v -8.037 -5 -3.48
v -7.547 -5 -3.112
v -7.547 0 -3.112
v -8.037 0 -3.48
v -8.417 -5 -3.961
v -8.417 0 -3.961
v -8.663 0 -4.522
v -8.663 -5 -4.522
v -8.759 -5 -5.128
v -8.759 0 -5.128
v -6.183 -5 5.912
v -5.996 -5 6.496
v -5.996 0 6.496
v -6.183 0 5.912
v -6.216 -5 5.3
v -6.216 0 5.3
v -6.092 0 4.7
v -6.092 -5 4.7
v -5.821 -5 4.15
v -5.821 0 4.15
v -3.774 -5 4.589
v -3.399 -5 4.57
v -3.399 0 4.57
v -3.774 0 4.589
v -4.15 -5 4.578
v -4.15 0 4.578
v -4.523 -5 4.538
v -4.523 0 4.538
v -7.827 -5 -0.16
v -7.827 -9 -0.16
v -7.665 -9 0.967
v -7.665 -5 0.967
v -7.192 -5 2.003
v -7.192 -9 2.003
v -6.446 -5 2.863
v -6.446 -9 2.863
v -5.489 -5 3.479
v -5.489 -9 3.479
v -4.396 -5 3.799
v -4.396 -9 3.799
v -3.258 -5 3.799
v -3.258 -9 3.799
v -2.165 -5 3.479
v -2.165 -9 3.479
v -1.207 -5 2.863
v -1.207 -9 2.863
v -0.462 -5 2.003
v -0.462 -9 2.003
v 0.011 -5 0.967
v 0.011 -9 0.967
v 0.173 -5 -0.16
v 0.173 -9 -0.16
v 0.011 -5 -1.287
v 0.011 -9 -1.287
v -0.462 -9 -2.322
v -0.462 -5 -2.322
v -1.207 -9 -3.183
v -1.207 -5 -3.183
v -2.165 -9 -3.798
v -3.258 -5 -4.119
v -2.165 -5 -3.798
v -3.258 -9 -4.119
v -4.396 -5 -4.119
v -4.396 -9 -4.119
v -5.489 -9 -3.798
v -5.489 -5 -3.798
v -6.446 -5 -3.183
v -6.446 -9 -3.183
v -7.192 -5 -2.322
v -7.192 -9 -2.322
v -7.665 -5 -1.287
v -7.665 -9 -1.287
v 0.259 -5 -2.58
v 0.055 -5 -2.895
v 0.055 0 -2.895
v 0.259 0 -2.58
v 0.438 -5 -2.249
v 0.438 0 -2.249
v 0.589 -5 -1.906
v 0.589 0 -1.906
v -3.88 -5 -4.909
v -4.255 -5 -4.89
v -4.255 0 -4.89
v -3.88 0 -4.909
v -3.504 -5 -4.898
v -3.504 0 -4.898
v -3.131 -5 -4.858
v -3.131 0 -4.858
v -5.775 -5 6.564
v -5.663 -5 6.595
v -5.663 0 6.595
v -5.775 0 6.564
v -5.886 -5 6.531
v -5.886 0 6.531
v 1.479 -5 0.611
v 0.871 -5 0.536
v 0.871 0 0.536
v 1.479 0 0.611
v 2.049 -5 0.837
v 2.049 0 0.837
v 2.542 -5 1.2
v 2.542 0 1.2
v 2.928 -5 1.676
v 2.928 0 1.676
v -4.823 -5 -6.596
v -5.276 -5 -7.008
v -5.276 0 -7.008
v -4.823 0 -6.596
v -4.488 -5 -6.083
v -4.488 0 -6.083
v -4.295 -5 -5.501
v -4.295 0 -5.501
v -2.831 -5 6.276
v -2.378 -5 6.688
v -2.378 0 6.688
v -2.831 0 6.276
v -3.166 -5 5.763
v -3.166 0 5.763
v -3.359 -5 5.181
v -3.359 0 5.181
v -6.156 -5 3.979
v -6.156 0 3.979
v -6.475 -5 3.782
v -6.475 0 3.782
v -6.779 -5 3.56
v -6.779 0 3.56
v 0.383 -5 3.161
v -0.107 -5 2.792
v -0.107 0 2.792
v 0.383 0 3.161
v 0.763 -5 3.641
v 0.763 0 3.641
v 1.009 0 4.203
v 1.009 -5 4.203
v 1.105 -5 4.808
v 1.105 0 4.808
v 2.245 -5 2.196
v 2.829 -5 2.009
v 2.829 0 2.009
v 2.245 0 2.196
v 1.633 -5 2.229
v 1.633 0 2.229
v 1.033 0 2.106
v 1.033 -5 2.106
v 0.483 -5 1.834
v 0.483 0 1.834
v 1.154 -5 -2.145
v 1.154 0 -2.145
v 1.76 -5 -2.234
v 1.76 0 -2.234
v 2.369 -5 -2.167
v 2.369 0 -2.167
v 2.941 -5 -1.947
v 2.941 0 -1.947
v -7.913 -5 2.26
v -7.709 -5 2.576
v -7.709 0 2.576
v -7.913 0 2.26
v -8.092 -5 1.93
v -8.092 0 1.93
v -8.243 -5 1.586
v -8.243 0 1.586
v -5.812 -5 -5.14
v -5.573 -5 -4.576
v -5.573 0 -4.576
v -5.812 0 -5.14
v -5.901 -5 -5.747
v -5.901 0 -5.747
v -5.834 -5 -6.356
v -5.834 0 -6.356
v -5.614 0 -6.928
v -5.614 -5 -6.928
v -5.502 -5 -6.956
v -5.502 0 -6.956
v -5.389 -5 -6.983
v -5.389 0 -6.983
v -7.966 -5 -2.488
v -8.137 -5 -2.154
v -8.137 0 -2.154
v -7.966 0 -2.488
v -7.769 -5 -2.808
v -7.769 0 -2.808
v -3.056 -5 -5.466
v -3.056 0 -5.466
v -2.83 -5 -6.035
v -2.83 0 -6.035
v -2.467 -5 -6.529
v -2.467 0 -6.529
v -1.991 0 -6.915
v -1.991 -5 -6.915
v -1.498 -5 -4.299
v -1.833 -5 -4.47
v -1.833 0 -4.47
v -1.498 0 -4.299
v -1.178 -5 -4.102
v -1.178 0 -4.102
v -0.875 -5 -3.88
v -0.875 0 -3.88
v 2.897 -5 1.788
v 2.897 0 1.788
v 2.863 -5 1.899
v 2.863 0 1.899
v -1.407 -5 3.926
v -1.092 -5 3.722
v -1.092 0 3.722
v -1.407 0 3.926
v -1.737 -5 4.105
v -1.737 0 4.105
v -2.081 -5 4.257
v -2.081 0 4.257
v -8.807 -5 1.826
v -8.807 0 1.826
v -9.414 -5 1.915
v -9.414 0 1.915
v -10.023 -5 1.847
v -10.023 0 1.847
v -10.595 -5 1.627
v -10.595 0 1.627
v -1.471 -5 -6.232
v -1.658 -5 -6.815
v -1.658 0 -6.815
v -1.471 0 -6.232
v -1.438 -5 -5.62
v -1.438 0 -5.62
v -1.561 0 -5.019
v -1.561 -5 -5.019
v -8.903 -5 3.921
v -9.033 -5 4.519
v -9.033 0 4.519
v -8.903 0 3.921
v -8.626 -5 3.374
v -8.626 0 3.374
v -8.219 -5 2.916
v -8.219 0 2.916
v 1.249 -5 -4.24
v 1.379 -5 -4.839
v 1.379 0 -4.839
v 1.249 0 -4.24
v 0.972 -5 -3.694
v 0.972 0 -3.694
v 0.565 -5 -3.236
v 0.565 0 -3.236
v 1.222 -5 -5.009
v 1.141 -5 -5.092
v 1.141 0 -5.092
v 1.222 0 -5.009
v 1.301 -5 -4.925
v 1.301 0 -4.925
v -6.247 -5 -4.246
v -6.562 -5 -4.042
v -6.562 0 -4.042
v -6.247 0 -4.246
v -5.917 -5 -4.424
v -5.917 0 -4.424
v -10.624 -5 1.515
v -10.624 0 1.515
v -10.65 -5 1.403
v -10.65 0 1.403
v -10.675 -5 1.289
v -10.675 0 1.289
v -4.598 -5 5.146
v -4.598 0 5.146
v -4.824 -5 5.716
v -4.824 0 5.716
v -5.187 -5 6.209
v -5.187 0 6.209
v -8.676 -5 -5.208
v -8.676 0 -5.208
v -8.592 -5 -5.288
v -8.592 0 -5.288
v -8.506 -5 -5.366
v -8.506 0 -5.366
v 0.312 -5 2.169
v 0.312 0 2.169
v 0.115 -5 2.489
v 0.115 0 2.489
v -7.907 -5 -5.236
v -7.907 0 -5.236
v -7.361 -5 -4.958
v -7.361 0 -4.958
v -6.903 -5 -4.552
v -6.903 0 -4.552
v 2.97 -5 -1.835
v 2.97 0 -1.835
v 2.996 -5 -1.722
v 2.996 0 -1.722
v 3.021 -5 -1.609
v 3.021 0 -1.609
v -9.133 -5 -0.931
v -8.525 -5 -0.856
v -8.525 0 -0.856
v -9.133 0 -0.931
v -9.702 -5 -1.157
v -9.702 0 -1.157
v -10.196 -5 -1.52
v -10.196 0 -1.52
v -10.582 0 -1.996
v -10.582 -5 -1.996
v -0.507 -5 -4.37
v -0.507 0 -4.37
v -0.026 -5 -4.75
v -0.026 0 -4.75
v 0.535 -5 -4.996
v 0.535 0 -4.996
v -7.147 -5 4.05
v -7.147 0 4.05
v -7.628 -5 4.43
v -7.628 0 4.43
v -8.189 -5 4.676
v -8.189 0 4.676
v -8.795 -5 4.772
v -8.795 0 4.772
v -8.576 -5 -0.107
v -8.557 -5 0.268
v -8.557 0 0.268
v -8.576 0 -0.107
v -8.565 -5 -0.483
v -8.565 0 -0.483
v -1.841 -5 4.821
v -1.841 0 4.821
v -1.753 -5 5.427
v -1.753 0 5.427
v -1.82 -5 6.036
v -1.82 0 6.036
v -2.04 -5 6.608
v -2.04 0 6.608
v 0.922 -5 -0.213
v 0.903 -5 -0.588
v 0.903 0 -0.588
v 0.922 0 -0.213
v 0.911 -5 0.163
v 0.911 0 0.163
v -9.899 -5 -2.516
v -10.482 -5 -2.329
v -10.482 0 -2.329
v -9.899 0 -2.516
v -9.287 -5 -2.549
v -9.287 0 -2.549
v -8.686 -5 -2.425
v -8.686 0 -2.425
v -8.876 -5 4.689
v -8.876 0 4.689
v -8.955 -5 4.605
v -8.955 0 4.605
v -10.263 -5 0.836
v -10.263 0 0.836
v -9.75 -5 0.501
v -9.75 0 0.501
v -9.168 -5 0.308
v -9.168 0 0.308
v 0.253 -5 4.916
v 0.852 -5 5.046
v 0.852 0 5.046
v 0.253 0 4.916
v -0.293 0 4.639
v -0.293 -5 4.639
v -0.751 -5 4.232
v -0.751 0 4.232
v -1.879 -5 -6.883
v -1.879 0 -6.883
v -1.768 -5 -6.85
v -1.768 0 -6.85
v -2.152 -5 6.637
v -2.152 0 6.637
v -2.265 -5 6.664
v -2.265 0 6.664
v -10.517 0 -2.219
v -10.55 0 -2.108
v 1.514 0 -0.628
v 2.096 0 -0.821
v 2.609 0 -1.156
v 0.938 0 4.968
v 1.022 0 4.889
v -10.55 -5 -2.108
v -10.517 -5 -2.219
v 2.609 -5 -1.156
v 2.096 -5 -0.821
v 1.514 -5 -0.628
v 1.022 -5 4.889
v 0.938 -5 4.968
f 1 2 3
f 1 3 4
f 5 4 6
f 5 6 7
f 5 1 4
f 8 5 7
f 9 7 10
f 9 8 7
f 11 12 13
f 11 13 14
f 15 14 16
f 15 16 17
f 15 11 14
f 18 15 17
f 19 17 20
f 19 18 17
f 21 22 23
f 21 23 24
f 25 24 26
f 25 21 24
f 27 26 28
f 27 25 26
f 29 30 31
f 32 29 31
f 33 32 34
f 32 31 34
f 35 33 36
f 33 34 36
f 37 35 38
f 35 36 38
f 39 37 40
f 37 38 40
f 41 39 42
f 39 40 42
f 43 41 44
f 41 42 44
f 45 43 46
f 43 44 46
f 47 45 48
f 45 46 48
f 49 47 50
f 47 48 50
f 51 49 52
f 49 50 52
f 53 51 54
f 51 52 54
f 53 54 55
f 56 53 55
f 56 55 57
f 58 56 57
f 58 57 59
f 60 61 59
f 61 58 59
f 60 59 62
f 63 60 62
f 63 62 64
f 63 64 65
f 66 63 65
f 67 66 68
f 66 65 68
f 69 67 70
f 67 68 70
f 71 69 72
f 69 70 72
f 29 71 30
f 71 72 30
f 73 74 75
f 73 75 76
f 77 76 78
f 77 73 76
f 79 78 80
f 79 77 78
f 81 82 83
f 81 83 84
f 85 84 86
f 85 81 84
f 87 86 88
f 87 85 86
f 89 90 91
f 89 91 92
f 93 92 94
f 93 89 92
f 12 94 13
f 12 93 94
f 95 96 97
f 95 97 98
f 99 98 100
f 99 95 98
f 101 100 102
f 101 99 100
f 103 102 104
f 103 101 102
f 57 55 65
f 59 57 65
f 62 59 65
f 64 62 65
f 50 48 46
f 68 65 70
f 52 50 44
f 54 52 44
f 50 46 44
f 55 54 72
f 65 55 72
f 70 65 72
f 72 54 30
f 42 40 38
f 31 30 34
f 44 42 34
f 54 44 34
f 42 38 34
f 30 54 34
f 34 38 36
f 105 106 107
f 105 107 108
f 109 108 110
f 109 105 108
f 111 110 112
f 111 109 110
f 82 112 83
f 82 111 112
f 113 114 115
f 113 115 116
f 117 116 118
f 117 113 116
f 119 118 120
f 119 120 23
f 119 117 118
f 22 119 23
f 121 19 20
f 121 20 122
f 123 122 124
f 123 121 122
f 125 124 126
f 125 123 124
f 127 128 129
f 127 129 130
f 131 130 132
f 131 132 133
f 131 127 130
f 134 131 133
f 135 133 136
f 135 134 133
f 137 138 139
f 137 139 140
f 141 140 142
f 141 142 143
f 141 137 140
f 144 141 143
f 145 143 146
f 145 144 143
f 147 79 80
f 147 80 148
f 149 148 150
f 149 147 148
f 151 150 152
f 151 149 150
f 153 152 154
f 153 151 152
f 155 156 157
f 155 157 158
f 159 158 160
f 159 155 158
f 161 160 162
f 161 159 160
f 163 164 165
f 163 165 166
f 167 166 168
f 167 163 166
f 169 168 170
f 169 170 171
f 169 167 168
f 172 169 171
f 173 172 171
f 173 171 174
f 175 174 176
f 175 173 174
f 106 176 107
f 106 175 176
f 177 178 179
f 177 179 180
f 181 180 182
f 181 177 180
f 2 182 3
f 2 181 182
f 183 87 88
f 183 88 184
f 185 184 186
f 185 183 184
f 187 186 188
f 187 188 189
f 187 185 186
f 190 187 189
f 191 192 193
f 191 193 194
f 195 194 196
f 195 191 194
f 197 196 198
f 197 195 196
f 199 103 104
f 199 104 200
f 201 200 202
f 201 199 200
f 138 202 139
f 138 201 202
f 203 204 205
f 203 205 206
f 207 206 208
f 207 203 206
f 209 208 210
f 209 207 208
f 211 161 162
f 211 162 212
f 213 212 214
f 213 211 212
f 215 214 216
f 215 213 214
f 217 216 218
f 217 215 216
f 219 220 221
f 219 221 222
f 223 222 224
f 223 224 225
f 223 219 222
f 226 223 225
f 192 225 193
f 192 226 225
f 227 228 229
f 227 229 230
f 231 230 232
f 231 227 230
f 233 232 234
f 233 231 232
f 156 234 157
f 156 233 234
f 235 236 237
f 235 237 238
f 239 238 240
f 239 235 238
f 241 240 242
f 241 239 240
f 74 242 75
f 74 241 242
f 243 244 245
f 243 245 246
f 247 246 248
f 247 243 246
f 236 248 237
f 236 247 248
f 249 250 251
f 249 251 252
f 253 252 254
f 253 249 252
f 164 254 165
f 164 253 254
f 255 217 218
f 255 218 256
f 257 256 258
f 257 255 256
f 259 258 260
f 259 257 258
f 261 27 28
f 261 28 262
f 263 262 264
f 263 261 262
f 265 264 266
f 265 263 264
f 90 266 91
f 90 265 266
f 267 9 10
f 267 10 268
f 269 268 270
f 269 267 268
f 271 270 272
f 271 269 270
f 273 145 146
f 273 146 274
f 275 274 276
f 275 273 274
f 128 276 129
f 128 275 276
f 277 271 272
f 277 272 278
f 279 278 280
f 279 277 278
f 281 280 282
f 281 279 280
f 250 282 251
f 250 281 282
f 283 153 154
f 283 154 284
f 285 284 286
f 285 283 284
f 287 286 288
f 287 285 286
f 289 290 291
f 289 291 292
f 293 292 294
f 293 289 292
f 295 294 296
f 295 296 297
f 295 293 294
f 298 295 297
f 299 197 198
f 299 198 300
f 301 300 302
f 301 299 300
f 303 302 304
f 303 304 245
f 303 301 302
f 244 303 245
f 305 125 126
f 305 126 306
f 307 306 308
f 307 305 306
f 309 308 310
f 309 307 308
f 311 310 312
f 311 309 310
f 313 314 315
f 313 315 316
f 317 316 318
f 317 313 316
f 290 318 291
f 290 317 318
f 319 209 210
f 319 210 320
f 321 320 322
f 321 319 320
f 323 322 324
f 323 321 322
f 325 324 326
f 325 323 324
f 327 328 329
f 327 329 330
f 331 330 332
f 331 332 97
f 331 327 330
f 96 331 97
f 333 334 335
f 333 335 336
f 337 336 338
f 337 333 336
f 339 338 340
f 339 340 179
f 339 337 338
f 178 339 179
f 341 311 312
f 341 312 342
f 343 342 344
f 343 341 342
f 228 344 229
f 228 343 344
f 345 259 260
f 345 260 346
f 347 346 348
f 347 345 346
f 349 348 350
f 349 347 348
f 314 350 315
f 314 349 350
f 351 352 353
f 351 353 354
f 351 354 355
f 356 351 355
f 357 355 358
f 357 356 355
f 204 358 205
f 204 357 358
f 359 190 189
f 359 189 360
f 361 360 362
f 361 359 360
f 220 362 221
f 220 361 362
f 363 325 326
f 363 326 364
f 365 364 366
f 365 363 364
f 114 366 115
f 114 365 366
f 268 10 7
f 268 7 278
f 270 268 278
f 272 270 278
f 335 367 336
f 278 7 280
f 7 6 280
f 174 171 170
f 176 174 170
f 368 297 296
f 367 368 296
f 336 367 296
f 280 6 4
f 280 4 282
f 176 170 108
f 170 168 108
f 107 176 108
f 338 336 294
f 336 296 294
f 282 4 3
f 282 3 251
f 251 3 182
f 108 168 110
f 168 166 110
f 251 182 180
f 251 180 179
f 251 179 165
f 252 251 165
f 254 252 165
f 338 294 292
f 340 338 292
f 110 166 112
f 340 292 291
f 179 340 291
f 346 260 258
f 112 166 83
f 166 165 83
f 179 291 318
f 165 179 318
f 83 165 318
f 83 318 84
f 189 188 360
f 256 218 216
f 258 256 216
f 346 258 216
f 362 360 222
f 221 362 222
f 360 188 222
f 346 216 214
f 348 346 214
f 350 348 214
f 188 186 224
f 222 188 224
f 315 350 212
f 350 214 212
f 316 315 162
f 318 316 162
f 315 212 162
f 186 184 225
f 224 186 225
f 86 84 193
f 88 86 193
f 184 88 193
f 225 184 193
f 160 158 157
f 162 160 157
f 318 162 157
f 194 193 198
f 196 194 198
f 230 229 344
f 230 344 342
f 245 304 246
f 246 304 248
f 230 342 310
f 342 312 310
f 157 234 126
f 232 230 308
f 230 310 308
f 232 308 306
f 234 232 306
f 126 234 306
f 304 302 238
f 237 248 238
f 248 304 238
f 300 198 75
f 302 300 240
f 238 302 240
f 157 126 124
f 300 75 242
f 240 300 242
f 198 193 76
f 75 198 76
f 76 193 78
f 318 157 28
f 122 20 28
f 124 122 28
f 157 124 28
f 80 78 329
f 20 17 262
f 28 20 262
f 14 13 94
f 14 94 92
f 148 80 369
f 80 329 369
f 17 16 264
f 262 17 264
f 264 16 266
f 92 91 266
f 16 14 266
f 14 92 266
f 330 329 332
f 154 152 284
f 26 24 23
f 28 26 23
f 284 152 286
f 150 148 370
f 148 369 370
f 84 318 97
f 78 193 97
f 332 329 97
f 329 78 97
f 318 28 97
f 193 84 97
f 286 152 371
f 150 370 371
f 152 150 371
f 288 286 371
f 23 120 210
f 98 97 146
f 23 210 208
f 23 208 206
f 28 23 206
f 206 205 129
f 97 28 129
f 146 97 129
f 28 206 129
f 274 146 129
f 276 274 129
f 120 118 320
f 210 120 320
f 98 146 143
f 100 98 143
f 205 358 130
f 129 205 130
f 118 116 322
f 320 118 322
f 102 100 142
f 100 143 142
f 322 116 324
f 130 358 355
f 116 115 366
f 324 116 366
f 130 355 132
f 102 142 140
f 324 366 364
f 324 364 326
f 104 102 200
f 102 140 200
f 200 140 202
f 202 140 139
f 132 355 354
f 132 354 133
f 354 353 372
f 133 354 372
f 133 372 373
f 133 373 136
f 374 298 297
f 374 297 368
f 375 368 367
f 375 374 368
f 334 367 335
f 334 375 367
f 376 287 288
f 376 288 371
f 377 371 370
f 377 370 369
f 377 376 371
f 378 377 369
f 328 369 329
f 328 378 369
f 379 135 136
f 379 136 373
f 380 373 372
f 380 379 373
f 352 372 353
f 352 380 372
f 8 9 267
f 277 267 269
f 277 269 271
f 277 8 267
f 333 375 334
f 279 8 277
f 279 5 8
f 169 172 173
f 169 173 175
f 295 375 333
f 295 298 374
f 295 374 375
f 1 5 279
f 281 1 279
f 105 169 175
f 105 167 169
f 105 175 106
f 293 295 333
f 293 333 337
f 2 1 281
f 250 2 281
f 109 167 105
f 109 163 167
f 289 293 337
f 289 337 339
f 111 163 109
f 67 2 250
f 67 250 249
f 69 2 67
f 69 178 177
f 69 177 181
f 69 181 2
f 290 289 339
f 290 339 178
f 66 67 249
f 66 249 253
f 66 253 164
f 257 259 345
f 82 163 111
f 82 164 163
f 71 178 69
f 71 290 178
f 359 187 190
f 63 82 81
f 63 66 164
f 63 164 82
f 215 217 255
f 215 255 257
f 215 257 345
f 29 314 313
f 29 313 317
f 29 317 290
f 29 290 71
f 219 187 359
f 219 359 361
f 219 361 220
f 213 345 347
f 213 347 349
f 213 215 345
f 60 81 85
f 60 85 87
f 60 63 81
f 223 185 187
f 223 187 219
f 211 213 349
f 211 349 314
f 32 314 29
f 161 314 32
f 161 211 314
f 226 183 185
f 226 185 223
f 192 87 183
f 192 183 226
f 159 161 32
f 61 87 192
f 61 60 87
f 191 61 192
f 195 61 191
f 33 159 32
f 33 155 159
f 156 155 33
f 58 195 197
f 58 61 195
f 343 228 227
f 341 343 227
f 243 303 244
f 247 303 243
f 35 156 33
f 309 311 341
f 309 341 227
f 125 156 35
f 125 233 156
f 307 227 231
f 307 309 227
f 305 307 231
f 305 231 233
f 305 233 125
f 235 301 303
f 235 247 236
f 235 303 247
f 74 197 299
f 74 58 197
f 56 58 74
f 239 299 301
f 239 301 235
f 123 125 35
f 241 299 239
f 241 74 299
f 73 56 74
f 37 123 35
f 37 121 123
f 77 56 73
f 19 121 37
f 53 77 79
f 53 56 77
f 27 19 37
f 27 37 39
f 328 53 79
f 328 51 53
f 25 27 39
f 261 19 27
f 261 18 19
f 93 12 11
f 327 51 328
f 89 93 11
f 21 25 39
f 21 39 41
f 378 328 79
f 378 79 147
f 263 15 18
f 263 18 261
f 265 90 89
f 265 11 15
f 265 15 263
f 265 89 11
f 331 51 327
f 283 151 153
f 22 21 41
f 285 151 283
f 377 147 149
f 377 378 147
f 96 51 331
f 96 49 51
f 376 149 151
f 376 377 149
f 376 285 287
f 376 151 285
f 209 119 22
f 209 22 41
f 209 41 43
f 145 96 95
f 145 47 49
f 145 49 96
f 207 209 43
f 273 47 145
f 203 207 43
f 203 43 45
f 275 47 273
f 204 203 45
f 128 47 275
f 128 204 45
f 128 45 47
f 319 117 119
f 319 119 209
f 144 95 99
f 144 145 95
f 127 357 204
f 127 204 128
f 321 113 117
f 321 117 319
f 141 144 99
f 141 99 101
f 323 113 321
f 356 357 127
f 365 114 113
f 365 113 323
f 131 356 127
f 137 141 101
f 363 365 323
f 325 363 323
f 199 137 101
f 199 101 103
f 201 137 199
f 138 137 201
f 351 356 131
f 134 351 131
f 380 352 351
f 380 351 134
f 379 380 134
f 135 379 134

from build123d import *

# Parameters (mm, degrees)
SKETCH1_R           = 4
BOSS_EXTRUDE1_DEPTH = 5
BOSS_EXTRUDE2_START = -9
SKETCH2_R           = 4
BOSS_EXTRUDE2_DEPTH = 9


with BuildPart() as part:
    # Sketch1 → Boss-Extrude1 (new body)
    with BuildSketch(Plane.XZ.offset(5)):
        with BuildLine():
            ThreePointArc((0.852350502, 5.046340911), (-0.292914214, 4.63874602), (-1.091544478, 3.722255668))
            ThreePointArc((-1.091544478, 3.722255668), (-1.570358996, 4.018783876), (-2.080910718, 4.256542705))
            ThreePointArc((-2.080910718, 4.256542705), (-1.75253572, 5.426984811), (-2.039802025, 6.60818883))
            ThreePointArc((-2.039802025, 6.60818883), (-2.208224588, 6.650434309), (-2.377643182, 6.68848927))
            ThreePointArc((-2.377643182, 6.68848927), (-3.165674074, 5.762869382), (-3.399062995, 4.569850323))
            ThreePointArc((-3.399062995, 4.569850323), (-3.961992636, 4.587244025), (-4.523022811, 4.537873349))
            ThreePointArc((-4.523022811, 4.537873349), (-4.823862774, 5.715693447), (-5.663244701, 6.595012981))
            ThreePointArc((-5.663244701, 6.595012981), (-5.830225658, 6.547387358), (-5.995973945, 6.495634624))
            ThreePointArc((-5.995973945, 6.495634624), (-6.215618773, 5.300008841), (-5.821229978, 4.150129568))
            ThreePointArc((-5.821229978, 4.150129568), (-6.317438198, 3.883728135), (-6.778619245, 3.560456788))
            ThreePointArc((-6.778619245, 3.560456788), (-7.628064343, 4.430058932), (-8.794650183, 4.771881024))
            ThreePointArc((-8.794650183, 4.771881024), (-8.915447123, 4.647145545), (-9.033112983, 4.51945222))
            ThreePointArc((-9.033112983, 4.51945222), (-8.625518092, 3.374187504), (-7.709027739, 2.57555724))
            ThreePointArc((-7.709027739, 2.57555724), (-8.005555948, 2.096742722), (-8.243314776, 1.586191))
            ThreePointArc((-8.243314776, 1.586191), (-9.413756883, 1.914565998), (-10.594960902, 1.627299693))
            ThreePointArc((-10.594960902, 1.627299693), (-10.63720638, 1.45887713), (-10.675261342, 1.289458536))
            ThreePointArc((-10.675261342, 1.289458536), (-9.749641454, 0.501427644), (-8.556622395, 0.268038723))
            ThreePointArc((-8.556622395, 0.268038723), (-8.574016096, -0.294890918), (-8.524645421, -0.855921093))
            ThreePointArc((-8.524645421, -0.855921093), (-9.702465518, -1.156761056), (-10.581785053, -1.996142983))
            ThreePointArc((-10.581785053, -1.996142983), (-10.53415943, -2.16312394), (-10.482406696, -2.328872227))
            ThreePointArc((-10.482406696, -2.328872227), (-9.286780912, -2.548517055), (-8.136901639, -2.15412826))
            ThreePointArc((-8.136901639, -2.15412826), (-7.870500207, -2.65033648), (-7.54722886, -3.111517527))
            ThreePointArc((-7.54722886, -3.111517527), (-8.416831004, -3.960962625), (-8.758653095, -5.127548465))
            ThreePointArc((-8.758653095, -5.127548465), (-8.633917617, -5.248345404), (-8.506224291, -5.366011265))
            ThreePointArc((-8.506224291, -5.366011265), (-7.360959576, -4.958416374), (-6.562329312, -4.041926021))
            ThreePointArc((-6.562329312, -4.041926021), (-6.083514793, -4.33845423), (-5.572963071, -4.576213058))
            ThreePointArc((-5.572963071, -4.576213058), (-5.90133807, -5.746655165), (-5.614071764, -6.927859184))
            ThreePointArc((-5.614071764, -6.927859184), (-5.445649202, -6.970104662), (-5.276230608, -7.008159624))
            ThreePointArc((-5.276230608, -7.008159624), (-4.488199715, -6.082539736), (-4.254810795, -4.889520676))
            ThreePointArc((-4.254810795, -4.889520676), (-3.691881154, -4.906914378), (-3.130850979, -4.857543703))
            ThreePointArc((-3.130850979, -4.857543703), (-2.830011016, -6.0353638), (-1.990629088, -6.914683335))
            ThreePointArc((-1.990629088, -6.914683335), (-1.823648131, -6.867057711), (-1.657899844, -6.815304978))
            ThreePointArc((-1.657899844, -6.815304978), (-1.438255016, -5.619679194), (-1.832643812, -4.469799921))
            ThreePointArc((-1.832643812, -4.469799921), (-1.336435592, -4.203398489), (-0.875254545, -3.880127142))
            ThreePointArc((-0.875254545, -3.880127142), (-0.025809446, -4.749729286), (1.140776394, -5.091551377))
            ThreePointArc((1.140776394, -5.091551377), (1.261573333, -4.966815899), (1.379239193, -4.839122573))
            ThreePointArc((1.379239193, -4.839122573), (0.971644302, -3.693857858), (0.05515395, -2.895227594))
            ThreePointArc((0.05515395, -2.895227594), (0.351682158, -2.416413075), (0.589440987, -1.905861353))
            ThreePointArc((0.589440987, -1.905861353), (1.759883093, -2.234236352), (2.941087112, -1.946970046))
            ThreePointArc((2.941087112, -1.946970046), (2.983332591, -1.778547484), (3.021387552, -1.60912889))
            ThreePointArc((3.021387552, -1.60912889), (2.095767664, -0.821097997), (0.902748605, -0.587709077))
            ThreePointArc((0.902748605, -0.587709077), (0.920142307, -0.024779436), (0.870771631, 0.536250739))
            ThreePointArc((0.870771631, 0.536250739), (2.048591729, 0.837090702), (2.927911263, 1.67647263))
            ThreePointArc((2.927911263, 1.67647263), (2.88028564, 1.843453587), (2.828532906, 2.009201874))
            ThreePointArc((2.828532906, 2.009201874), (1.632907123, 2.228846702), (0.48302785, 1.834457906))
            ThreePointArc((0.48302785, 1.834457906), (0.216626417, 2.330666127), (-0.10664493, 2.791847173))
            ThreePointArc((-0.10664493, 2.791847173), (0.762957214, 3.641292272), (1.104779306, 4.807878112))
            ThreePointArc((1.104779306, 4.807878112), (0.980043827, 4.928675051), (0.852350502, 5.046340911))
        make_face()
        with Locations(Location((-3.826936895, -0.159835177, 0), (0, 0, 180))):
            Circle(SKETCH1_R, mode=Mode.SUBTRACT)
    extrude(amount=-BOSS_EXTRUDE1_DEPTH)

    # Sketch2 → Boss-Extrude2 (add)
    with BuildSketch(Plane(origin=(0, 0, 0), x_dir=(1, 0, 0), z_dir=(0, 1, 0)).offset(BOSS_EXTRUDE2_START)):
        with Locations(Location((-3.826936895, 0.159835177, 0), (0, 0, 180))):
            Circle(SKETCH2_R)
    extrude(amount=BOSS_EXTRUDE2_DEPTH)


solid = part.part
